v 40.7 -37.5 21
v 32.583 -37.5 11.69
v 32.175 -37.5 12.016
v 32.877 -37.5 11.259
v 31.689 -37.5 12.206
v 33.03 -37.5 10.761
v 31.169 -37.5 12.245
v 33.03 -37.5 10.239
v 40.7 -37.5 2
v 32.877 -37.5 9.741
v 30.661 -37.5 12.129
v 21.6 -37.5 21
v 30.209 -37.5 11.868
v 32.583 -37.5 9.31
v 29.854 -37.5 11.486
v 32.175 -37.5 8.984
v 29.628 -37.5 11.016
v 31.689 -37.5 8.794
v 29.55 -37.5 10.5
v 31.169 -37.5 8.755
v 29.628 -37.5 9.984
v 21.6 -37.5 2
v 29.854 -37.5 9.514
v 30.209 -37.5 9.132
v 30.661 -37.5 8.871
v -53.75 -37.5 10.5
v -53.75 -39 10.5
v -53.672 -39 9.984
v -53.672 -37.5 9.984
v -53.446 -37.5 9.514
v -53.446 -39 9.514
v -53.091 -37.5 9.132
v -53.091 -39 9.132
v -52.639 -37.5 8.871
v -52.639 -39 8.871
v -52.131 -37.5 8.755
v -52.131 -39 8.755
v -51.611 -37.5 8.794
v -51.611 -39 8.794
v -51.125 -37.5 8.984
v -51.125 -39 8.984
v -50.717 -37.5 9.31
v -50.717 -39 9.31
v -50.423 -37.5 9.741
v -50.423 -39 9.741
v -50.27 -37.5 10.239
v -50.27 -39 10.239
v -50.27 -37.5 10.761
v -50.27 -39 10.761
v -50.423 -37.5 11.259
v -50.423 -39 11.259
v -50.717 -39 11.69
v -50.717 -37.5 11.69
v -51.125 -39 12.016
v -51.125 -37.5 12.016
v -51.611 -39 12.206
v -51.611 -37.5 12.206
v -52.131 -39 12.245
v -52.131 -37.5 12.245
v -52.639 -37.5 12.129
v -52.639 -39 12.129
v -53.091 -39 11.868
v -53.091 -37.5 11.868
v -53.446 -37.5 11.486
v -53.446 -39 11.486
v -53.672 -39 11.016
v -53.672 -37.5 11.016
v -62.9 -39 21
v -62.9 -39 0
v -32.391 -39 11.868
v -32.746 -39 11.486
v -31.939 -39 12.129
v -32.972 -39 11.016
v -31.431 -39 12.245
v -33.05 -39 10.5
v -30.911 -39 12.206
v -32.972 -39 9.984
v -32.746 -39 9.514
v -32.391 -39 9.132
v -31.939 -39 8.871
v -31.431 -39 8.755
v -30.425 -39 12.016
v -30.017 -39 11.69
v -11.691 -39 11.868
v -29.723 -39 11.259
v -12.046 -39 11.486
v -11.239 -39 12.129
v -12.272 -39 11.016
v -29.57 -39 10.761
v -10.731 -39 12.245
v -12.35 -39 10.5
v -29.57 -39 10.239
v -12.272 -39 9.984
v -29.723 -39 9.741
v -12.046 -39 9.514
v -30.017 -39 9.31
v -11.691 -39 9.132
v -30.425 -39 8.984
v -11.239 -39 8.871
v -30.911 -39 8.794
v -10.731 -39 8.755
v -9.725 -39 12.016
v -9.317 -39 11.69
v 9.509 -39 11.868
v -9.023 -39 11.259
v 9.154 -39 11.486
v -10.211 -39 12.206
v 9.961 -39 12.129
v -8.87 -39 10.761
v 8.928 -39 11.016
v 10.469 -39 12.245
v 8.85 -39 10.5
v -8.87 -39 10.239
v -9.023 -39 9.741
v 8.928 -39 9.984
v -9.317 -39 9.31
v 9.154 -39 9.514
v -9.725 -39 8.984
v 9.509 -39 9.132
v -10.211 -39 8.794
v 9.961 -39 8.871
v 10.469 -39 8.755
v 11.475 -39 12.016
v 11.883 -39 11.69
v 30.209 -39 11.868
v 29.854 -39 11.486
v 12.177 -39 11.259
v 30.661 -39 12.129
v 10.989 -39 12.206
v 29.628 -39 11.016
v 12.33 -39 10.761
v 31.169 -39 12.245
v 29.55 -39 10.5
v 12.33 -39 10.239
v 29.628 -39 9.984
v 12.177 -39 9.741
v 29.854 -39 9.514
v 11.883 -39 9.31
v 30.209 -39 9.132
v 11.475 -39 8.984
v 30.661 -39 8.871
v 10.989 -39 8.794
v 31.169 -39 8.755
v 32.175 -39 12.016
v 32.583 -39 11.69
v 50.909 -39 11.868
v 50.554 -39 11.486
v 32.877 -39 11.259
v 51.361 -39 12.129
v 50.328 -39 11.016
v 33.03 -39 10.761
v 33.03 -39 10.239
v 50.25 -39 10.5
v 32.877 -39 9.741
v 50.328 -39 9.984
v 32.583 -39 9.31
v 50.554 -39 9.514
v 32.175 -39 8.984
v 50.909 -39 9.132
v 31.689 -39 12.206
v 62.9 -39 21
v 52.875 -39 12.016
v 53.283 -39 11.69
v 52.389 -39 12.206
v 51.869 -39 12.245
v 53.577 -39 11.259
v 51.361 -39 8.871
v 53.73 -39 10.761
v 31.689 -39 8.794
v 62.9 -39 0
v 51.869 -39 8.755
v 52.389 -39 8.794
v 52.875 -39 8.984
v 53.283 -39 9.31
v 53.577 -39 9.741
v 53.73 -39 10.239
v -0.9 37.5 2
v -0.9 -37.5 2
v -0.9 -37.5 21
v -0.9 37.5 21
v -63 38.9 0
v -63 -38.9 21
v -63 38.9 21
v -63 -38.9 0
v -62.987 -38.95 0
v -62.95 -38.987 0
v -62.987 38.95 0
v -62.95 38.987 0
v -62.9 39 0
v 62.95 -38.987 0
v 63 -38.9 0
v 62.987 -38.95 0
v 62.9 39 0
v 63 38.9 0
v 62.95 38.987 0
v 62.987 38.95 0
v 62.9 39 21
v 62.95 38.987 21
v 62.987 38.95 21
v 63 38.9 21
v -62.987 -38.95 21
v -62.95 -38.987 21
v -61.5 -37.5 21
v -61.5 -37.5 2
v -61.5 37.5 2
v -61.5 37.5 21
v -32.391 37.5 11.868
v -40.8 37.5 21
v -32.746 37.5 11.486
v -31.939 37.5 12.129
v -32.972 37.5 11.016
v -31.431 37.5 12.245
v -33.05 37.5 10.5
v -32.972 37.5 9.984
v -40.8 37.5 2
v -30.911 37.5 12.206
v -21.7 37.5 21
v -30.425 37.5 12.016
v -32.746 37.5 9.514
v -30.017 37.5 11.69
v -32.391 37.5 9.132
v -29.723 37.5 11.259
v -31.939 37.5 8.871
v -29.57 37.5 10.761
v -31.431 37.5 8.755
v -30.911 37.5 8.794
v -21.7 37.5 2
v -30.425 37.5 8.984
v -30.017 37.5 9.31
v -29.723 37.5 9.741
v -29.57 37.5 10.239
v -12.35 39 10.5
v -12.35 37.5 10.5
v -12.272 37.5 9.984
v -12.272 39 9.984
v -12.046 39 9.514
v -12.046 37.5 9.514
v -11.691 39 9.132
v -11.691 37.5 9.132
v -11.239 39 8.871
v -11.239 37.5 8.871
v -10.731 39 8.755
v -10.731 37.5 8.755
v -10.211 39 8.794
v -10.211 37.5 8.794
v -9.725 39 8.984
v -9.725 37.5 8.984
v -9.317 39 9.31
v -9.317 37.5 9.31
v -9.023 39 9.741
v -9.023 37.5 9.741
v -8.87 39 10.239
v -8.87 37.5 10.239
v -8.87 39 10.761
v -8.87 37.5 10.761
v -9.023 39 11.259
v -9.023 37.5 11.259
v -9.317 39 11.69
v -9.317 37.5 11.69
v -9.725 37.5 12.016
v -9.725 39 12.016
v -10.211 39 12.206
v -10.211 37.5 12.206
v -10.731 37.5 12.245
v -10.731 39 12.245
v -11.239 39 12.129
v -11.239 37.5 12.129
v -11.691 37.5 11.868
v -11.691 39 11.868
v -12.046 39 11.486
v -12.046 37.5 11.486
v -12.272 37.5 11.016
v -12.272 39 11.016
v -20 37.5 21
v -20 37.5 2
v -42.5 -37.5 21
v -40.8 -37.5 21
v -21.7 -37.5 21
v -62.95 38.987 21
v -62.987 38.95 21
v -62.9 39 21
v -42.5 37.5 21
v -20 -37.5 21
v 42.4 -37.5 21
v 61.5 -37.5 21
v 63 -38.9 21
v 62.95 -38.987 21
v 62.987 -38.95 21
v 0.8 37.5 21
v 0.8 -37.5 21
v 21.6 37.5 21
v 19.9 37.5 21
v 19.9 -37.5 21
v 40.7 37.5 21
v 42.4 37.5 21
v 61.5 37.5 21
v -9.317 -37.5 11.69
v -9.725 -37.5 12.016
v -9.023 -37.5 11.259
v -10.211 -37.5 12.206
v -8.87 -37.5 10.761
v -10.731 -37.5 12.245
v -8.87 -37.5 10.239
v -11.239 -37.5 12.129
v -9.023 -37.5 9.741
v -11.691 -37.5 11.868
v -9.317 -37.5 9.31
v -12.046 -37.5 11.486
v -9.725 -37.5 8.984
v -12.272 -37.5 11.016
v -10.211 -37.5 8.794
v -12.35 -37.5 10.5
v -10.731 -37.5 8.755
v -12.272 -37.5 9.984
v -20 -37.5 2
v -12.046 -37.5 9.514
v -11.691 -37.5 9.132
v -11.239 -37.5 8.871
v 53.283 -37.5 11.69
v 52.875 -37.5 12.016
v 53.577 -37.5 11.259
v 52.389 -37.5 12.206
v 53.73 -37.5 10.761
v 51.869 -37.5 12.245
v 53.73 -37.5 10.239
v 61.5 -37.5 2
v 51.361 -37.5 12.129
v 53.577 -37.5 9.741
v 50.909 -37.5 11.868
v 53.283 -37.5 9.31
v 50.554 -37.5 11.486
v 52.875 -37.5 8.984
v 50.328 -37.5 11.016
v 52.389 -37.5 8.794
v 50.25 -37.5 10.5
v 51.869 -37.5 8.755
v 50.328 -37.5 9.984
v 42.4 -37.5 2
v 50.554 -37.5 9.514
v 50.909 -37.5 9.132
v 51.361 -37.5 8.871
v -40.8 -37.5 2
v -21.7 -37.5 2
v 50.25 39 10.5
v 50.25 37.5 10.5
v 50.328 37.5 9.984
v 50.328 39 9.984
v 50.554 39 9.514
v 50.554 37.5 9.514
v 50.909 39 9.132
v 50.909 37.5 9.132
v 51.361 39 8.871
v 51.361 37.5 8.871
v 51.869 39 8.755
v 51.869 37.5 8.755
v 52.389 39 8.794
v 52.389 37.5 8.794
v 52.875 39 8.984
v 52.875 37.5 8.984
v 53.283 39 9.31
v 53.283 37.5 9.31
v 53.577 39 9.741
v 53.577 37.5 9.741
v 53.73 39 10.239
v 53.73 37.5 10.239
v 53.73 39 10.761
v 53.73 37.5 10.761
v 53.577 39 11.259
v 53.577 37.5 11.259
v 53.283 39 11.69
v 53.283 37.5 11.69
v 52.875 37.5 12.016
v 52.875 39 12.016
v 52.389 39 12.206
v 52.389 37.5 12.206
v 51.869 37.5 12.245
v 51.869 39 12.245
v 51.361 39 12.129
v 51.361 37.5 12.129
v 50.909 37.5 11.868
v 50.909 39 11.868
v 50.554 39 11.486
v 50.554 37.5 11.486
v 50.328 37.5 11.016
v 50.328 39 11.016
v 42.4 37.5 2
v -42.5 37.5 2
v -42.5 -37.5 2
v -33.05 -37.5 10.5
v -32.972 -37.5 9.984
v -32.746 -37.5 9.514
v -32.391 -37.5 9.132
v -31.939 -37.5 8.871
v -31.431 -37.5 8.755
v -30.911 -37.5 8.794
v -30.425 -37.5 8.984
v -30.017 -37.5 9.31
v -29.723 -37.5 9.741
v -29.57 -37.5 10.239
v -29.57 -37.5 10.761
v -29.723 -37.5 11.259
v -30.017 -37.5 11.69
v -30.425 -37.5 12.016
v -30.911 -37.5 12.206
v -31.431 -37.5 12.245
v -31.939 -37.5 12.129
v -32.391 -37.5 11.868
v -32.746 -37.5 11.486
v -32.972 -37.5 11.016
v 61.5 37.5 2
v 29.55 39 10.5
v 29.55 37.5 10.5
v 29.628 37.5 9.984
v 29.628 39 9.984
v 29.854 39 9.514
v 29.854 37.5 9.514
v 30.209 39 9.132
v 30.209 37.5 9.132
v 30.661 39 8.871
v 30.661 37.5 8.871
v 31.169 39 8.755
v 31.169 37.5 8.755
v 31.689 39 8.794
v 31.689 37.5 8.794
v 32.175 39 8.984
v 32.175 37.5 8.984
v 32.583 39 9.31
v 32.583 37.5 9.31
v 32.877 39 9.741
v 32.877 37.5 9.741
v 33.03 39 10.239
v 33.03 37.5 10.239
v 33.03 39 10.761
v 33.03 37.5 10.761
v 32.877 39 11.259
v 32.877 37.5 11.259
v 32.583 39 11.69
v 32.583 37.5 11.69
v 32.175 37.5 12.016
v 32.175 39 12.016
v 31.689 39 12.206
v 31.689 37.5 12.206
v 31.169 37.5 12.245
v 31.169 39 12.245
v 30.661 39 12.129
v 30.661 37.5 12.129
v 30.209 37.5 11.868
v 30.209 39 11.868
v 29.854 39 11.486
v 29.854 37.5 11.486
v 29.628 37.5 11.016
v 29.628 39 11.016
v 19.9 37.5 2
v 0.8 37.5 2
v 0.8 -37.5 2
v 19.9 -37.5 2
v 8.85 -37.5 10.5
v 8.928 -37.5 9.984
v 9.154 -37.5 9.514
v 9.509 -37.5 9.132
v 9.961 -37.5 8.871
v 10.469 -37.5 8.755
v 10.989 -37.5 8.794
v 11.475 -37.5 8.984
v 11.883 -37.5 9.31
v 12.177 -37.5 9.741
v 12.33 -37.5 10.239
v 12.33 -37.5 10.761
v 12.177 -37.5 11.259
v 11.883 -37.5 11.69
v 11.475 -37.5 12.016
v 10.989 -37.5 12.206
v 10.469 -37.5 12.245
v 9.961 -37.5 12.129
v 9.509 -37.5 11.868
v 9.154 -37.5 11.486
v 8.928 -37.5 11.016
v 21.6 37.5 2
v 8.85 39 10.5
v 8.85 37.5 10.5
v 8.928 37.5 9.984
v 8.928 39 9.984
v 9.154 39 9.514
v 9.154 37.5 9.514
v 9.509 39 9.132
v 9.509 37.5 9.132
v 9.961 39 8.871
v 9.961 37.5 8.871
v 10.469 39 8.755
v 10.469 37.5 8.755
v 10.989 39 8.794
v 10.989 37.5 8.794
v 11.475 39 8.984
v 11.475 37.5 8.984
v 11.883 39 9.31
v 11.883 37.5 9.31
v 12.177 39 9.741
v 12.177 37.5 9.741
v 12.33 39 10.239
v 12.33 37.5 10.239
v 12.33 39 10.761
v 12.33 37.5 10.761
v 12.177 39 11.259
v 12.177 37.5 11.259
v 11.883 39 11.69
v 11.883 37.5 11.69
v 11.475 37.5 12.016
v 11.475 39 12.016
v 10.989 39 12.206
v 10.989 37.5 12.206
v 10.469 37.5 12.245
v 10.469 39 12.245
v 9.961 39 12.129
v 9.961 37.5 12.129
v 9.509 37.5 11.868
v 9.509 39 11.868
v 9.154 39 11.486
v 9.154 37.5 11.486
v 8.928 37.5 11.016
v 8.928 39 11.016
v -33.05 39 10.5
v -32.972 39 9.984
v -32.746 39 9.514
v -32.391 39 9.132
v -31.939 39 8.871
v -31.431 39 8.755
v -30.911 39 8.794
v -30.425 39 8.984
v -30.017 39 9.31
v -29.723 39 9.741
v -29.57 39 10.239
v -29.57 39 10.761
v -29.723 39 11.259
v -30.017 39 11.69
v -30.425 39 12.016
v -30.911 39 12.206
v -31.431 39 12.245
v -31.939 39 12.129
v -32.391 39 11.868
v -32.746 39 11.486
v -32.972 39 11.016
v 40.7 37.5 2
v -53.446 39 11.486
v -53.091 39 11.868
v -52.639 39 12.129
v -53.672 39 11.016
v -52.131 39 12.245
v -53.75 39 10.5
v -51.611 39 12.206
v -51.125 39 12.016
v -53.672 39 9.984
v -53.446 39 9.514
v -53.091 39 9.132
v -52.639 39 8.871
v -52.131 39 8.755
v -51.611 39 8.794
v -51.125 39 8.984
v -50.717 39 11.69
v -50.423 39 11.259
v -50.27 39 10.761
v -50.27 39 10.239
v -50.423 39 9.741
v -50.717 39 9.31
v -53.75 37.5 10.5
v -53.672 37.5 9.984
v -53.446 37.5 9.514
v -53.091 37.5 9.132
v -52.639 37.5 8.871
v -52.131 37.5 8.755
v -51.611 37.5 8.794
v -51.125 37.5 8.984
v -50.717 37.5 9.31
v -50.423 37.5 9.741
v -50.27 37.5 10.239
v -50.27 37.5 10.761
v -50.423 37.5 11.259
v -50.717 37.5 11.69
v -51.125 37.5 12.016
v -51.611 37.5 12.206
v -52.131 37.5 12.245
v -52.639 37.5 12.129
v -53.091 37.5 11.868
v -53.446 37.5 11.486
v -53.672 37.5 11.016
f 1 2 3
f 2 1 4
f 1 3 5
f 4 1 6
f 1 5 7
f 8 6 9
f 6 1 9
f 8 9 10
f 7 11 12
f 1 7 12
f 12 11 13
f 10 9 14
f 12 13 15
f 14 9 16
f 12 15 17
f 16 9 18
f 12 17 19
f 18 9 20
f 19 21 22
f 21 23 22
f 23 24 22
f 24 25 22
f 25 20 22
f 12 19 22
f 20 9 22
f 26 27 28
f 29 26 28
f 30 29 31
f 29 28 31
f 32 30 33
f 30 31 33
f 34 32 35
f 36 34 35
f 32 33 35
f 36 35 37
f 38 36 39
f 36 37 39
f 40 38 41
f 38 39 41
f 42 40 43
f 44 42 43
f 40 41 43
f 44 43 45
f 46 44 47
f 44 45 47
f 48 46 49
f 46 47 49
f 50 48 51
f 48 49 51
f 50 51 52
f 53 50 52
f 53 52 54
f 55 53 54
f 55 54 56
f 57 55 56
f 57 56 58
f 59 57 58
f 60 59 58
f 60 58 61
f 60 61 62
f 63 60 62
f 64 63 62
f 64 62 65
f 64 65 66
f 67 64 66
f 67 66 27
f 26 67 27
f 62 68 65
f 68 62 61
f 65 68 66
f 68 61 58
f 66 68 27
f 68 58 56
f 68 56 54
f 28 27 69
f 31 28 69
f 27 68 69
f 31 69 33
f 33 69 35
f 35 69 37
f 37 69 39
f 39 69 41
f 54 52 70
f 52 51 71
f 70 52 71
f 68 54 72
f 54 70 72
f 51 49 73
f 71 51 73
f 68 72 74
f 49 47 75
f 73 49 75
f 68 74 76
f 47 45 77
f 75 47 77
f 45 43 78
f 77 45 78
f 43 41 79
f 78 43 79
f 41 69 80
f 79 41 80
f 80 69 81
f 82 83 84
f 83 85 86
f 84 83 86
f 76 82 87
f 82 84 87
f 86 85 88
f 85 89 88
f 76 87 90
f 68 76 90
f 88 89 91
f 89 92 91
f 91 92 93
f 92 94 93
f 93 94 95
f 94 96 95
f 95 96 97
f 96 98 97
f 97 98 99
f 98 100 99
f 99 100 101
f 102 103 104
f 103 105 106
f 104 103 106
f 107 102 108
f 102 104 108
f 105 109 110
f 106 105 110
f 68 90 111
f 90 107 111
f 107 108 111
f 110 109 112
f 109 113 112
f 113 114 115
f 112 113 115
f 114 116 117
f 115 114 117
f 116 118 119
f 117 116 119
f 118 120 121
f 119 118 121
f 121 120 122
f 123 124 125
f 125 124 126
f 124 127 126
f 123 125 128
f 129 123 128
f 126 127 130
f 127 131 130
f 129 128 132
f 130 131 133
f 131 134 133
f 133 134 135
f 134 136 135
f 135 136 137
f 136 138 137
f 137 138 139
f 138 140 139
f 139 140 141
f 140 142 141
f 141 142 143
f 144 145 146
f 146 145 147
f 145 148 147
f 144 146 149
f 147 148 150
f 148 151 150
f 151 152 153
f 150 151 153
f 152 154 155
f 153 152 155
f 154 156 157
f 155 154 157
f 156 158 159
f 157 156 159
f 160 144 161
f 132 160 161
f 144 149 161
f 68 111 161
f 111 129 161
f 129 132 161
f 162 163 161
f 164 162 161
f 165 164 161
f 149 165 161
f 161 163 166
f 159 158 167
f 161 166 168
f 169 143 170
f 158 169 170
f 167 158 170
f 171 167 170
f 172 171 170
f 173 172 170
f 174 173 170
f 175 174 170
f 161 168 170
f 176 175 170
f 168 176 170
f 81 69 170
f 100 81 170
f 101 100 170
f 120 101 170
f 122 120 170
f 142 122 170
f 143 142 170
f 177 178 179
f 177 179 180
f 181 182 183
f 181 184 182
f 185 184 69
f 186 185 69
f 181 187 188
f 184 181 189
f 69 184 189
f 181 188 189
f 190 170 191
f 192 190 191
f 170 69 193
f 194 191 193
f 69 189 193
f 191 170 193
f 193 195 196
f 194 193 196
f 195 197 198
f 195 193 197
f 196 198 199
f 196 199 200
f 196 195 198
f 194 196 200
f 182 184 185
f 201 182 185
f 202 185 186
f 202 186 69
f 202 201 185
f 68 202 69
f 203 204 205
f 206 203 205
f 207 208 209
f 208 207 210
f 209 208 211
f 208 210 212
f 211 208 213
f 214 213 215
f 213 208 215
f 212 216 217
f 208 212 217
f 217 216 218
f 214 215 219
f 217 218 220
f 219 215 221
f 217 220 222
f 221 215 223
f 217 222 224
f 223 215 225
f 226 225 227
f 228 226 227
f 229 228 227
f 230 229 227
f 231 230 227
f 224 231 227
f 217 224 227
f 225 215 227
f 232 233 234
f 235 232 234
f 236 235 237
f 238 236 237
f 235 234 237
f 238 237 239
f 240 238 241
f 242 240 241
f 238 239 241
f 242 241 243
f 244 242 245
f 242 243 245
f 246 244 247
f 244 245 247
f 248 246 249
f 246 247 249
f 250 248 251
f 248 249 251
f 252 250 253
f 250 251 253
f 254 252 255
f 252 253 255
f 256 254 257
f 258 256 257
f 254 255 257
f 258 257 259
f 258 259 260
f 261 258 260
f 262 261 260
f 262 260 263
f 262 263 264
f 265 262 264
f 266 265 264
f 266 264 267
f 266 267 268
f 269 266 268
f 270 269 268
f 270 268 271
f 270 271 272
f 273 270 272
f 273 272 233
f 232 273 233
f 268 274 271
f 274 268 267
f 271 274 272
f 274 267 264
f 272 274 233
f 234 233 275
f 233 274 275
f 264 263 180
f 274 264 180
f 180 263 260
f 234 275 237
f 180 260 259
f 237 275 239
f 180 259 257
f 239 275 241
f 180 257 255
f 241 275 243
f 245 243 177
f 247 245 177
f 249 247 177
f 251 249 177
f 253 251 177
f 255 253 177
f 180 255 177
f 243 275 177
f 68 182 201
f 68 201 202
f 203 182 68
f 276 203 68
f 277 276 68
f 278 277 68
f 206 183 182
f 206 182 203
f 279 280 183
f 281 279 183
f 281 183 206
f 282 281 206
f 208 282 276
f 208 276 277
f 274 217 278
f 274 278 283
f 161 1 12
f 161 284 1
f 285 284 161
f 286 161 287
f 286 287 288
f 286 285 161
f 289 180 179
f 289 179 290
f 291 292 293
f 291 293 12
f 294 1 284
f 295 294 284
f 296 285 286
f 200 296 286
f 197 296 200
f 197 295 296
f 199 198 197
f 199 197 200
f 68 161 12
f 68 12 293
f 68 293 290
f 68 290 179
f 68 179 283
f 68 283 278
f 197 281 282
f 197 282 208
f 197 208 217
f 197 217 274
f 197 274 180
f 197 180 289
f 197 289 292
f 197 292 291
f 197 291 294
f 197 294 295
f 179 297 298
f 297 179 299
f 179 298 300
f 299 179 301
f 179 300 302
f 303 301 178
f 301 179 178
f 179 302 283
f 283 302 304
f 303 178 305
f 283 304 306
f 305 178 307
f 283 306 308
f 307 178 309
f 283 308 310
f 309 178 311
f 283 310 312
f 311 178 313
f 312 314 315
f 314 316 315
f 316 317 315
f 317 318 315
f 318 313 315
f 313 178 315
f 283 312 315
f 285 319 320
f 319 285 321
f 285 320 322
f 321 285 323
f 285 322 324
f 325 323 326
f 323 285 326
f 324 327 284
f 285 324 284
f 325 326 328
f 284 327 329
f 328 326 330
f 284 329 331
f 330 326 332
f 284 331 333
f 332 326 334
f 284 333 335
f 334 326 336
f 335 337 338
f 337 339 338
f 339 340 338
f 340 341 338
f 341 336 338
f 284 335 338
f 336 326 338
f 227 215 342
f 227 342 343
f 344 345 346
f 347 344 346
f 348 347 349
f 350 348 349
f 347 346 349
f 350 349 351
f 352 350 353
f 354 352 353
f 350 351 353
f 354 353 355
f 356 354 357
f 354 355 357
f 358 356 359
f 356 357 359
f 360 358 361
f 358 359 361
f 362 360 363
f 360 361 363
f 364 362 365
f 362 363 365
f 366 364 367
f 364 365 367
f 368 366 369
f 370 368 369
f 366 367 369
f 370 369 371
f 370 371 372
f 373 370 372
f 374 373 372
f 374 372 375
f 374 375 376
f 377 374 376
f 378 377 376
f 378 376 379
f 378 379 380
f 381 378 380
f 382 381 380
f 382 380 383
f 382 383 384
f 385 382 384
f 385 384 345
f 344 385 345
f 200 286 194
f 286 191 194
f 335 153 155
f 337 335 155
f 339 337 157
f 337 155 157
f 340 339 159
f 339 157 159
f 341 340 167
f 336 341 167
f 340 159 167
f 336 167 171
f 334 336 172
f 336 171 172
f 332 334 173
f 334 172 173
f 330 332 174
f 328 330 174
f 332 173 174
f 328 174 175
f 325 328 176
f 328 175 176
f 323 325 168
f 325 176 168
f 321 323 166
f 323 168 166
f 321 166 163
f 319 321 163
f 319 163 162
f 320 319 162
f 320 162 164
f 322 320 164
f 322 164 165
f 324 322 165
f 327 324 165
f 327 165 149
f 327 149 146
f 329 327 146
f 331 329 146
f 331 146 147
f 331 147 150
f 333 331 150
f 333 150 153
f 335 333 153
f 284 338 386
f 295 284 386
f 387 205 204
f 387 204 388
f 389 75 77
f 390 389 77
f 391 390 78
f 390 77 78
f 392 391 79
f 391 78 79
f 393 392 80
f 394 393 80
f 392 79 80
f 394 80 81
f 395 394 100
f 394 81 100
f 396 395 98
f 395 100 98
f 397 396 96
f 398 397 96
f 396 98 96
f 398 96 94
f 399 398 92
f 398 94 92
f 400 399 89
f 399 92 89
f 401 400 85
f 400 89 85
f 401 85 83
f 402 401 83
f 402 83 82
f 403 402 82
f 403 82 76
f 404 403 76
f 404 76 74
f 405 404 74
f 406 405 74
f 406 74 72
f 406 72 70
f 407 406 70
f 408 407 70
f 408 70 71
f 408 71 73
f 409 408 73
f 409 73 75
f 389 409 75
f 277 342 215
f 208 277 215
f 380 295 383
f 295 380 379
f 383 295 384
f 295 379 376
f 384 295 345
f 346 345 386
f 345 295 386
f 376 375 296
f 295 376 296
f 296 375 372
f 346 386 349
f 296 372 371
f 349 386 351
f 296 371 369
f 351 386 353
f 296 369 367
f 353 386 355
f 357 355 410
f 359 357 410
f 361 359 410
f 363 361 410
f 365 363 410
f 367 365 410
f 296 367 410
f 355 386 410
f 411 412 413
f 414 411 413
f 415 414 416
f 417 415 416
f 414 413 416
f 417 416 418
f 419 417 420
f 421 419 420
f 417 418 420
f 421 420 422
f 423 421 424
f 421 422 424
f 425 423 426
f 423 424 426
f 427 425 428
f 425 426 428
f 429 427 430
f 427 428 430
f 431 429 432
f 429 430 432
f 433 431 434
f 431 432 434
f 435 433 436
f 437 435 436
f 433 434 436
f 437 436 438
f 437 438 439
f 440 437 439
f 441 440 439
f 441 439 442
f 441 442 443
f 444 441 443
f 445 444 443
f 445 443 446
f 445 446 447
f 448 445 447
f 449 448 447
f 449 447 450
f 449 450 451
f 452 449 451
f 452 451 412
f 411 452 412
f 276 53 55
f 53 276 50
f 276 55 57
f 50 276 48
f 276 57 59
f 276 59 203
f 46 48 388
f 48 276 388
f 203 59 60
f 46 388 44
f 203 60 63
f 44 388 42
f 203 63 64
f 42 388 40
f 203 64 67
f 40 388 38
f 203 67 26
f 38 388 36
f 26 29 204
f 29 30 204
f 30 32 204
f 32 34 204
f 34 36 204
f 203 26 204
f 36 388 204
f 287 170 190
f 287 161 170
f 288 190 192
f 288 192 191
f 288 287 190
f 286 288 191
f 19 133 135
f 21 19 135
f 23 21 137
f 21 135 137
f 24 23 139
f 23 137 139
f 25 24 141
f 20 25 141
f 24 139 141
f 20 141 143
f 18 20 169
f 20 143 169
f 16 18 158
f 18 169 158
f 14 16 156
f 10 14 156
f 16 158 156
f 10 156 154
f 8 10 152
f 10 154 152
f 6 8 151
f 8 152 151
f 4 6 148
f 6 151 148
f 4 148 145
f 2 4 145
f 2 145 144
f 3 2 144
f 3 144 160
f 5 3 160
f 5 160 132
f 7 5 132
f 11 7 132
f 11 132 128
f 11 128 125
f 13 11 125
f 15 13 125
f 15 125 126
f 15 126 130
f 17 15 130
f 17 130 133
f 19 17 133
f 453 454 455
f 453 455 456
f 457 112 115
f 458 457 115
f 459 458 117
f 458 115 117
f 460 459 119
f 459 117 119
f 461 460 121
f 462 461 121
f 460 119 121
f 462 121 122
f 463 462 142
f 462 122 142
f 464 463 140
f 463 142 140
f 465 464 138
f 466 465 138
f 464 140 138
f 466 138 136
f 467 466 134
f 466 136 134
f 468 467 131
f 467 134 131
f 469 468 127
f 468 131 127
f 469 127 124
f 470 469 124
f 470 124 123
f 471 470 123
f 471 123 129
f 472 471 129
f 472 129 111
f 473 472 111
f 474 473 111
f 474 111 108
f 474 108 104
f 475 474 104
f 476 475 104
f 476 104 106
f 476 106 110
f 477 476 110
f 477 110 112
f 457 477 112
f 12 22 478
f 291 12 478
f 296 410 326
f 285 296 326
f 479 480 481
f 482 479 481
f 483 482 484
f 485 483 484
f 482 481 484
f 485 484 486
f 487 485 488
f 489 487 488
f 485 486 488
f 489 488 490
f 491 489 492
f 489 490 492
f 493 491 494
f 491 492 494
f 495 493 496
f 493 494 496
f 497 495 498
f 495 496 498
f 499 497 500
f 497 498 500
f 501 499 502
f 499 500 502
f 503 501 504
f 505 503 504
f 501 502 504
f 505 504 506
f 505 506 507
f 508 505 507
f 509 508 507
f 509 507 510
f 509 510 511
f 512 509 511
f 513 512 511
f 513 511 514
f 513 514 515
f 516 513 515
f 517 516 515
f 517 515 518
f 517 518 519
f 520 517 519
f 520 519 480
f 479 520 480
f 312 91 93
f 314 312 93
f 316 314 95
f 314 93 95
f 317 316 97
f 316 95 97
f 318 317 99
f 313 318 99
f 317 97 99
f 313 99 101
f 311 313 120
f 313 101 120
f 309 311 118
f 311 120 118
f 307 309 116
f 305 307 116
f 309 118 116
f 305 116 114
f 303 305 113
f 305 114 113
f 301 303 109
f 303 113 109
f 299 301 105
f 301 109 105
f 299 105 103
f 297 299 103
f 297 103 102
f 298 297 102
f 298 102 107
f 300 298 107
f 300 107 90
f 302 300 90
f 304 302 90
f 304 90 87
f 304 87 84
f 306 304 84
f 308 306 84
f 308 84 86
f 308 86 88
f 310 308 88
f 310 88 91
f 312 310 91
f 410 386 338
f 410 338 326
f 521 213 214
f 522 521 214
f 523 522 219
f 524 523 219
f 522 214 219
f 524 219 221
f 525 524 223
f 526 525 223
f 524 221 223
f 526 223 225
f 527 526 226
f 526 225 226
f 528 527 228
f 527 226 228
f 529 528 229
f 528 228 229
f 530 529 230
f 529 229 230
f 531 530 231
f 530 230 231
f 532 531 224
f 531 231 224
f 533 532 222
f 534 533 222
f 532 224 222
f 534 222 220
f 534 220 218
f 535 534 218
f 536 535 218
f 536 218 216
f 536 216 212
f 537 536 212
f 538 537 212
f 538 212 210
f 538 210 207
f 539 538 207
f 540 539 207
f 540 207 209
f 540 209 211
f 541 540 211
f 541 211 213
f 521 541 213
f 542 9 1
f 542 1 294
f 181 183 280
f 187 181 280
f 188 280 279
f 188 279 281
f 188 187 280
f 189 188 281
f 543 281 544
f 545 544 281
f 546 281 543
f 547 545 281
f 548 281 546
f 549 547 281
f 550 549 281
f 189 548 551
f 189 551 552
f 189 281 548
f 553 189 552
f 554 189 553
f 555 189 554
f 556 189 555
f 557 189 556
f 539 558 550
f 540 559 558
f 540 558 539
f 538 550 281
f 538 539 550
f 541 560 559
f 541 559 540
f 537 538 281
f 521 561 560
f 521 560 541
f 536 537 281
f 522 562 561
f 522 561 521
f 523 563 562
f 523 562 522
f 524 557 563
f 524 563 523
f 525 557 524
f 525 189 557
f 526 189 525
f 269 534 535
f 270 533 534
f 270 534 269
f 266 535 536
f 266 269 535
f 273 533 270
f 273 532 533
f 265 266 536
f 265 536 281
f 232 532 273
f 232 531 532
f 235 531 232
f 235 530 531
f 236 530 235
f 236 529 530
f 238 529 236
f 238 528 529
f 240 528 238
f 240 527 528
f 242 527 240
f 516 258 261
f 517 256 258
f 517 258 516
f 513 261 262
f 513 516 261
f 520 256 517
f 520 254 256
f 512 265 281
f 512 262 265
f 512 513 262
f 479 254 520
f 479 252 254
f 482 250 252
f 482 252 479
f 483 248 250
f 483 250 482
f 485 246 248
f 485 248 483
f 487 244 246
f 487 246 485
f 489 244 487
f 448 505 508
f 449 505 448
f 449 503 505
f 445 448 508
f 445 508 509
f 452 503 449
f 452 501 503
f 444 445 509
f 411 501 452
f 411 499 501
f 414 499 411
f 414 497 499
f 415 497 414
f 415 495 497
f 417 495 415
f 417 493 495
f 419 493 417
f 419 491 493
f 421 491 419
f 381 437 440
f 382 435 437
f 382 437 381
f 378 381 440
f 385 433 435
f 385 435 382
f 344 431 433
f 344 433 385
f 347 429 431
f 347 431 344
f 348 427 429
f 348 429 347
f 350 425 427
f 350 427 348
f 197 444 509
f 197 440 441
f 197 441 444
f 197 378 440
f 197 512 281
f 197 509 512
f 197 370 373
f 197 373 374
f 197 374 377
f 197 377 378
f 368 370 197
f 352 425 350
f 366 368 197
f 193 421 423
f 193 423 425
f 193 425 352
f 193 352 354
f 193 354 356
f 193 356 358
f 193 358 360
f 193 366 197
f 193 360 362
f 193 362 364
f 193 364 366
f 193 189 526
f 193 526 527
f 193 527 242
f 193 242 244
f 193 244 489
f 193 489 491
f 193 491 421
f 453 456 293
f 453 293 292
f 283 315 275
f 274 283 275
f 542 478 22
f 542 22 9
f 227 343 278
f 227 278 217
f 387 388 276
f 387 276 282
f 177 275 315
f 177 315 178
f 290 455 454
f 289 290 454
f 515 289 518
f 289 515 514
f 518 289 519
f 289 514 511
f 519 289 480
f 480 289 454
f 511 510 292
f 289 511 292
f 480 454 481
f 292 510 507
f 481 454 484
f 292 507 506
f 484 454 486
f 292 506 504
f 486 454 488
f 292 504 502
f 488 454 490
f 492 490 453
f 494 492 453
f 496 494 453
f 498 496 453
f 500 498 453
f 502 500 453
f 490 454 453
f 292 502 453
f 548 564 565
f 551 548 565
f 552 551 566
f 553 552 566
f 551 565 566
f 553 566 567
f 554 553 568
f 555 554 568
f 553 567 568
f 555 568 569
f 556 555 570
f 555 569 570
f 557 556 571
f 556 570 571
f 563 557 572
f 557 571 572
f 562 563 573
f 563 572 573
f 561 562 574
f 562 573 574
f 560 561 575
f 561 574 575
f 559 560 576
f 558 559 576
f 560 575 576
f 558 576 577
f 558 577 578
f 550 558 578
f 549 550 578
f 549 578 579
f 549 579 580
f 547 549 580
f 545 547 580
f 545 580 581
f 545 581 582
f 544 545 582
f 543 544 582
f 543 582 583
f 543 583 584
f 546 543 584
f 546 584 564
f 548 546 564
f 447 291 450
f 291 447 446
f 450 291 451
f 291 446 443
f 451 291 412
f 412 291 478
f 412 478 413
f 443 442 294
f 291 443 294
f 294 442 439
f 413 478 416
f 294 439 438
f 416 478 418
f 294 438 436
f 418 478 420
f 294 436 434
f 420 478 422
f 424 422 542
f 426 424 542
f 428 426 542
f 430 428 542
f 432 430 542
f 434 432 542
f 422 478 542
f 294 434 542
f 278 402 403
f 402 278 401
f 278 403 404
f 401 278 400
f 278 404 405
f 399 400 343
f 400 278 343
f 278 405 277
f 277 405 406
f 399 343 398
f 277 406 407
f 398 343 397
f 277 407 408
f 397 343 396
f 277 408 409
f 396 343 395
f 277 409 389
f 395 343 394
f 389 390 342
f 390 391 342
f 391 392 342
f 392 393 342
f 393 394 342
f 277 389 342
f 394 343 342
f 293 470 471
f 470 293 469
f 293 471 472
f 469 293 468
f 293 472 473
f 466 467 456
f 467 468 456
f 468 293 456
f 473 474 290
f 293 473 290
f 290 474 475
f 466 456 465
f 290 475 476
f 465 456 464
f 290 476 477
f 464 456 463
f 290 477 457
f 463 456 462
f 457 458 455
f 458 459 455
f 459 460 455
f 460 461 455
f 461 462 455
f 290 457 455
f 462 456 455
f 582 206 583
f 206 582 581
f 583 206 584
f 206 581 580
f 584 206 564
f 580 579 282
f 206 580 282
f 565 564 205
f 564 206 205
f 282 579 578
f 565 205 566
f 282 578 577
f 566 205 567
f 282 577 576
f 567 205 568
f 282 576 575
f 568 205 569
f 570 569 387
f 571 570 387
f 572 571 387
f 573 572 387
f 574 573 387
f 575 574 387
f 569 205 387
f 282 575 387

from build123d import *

# Parameters (mm, degrees)
F0_W     = 126
F0_H     = 78
F1_DEPTH = 2
F2_W     = 126
F2_H     = 78
F2_W_2   = 1.7
F2_H_2   = 75
F3_DEPTH = 19
F5_DEPTH = 100
F6_R     = 0.1


with BuildPart() as f1:
    # F0 (on Top) → F1 (new body)
    with BuildSketch(Plane.XY):
        Rectangle(F0_W, F0_H)
    extrude(amount=F1_DEPTH)

    # F2 (on face) → F3 (join)
    with BuildSketch(Plane.XY.offset(2)):
        Rectangle(F2_W, F2_H)
        Polygon((42.4, 37.5), (61.5, 37.5), (61.5, -37.5), (42.4, -37.5), (40.7, -37.5), (21.6, -37.5), (19.9, -37.5), (0.8, -37.5), (-0.9, -37.5), (-20, -37.5), (-21.7, -37.5), (-40.8, -37.5), (-42.5, -37.5), (-61.5, -37.5), (-61.5, 37.5), (-42.5, 37.5), (-40.8, 37.5), (-21.7, 37.5), (-20, 37.5), (-0.9, 37.5), (0.8, 37.5), (19.9, 37.5), (21.6, 37.5), (40.7, 37.5), align=None, mode=Mode.SUBTRACT)
        with Locations((-41.65, 0)):
            Rectangle(F2_W_2, F2_H_2)
        with Locations((-20.85, 0)):
            Rectangle(F2_W_2, F2_H_2)
        with Locations((-0.05, 0)):
            Rectangle(F2_W_2, F2_H_2)
        with Locations((20.75, 0)):
            Rectangle(F2_W_2, F2_H_2)
        with Locations((41.55, 0)):
            Rectangle(F2_W_2, F2_H_2)
    extrude(amount=F3_DEPTH)

    # F4 (on face) → F5 (cut)
    with BuildSketch(Plane.XZ.offset(39)):
        with BuildLine():
            ThreePointArc((-50.25, 10.5), (-52, 12.25), (-53.75, 10.5))
            Line((-53.75, 10.5), (-50.25, 10.5))
        make_face()
        with BuildLine():
            ThreePointArc((53.75, 10.5), (52, 12.25), (50.25, 10.5))
            Line((50.25, 10.5), (53.75, 10.5))
        make_face()
        with BuildLine():
            Line((53.75, 10.5), (50.25, 10.5))
            ThreePointArc((50.25, 10.5), (52, 8.75), (53.75, 10.5))
        make_face()
        with BuildLine():
            ThreePointArc((33.05, 10.5), (31.3, 12.25), (29.55, 10.5))
            Line((29.55, 10.5), (33.05, 10.5))
        make_face()
        with BuildLine():
            Line((33.05, 10.5), (29.55, 10.5))
            ThreePointArc((29.55, 10.5), (31.3, 8.75), (33.05, 10.5))
        make_face()
        with BuildLine():
            ThreePointArc((12.35, 10.5), (10.6, 12.25), (8.85, 10.5))
            Line((8.85, 10.5), (12.35, 10.5))
        make_face()
        with BuildLine():
            Line((12.35, 10.5), (8.85, 10.5))
            ThreePointArc((8.85, 10.5), (10.6, 8.75), (12.35, 10.5))
        make_face()
        with BuildLine():
            ThreePointArc((-8.85, 10.5), (-10.6, 12.25), (-12.35, 10.5))
            Line((-12.35, 10.5), (-8.85, 10.5))
        make_face()
        with BuildLine():
            Line((-8.85, 10.5), (-12.35, 10.5))
            ThreePointArc((-12.35, 10.5), (-10.6, 8.75), (-8.85, 10.5))
        make_face()
        with BuildLine():
            ThreePointArc((-29.55, 10.5), (-31.3, 12.25), (-33.05, 10.5))
            Line((-33.05, 10.5), (-29.55, 10.5))
        make_face()
        with BuildLine():
            Line((-29.55, 10.5), (-33.05, 10.5))
            ThreePointArc((-33.05, 10.5), (-31.3, 8.75), (-29.55, 10.5))
        make_face()
        with BuildLine():
            Line((-50.25, 10.5), (-53.75, 10.5))
            ThreePointArc((-53.75, 10.5), (-52, 8.75), (-50.25, 10.5))
        make_face()
    extrude(amount=-F5_DEPTH, mode=Mode.SUBTRACT)

    # F6
    f6_edges = [f1.edges().sort_by_distance(p)[0] for p in [
        (-63, -39, 10.5),
        (63, -39, 10.5),
        (63, 39, 10.5),
        (-63, 39, 10.5),
    ]]
    fillet(f6_edges, radius=F6_R)


solid = f1.part
